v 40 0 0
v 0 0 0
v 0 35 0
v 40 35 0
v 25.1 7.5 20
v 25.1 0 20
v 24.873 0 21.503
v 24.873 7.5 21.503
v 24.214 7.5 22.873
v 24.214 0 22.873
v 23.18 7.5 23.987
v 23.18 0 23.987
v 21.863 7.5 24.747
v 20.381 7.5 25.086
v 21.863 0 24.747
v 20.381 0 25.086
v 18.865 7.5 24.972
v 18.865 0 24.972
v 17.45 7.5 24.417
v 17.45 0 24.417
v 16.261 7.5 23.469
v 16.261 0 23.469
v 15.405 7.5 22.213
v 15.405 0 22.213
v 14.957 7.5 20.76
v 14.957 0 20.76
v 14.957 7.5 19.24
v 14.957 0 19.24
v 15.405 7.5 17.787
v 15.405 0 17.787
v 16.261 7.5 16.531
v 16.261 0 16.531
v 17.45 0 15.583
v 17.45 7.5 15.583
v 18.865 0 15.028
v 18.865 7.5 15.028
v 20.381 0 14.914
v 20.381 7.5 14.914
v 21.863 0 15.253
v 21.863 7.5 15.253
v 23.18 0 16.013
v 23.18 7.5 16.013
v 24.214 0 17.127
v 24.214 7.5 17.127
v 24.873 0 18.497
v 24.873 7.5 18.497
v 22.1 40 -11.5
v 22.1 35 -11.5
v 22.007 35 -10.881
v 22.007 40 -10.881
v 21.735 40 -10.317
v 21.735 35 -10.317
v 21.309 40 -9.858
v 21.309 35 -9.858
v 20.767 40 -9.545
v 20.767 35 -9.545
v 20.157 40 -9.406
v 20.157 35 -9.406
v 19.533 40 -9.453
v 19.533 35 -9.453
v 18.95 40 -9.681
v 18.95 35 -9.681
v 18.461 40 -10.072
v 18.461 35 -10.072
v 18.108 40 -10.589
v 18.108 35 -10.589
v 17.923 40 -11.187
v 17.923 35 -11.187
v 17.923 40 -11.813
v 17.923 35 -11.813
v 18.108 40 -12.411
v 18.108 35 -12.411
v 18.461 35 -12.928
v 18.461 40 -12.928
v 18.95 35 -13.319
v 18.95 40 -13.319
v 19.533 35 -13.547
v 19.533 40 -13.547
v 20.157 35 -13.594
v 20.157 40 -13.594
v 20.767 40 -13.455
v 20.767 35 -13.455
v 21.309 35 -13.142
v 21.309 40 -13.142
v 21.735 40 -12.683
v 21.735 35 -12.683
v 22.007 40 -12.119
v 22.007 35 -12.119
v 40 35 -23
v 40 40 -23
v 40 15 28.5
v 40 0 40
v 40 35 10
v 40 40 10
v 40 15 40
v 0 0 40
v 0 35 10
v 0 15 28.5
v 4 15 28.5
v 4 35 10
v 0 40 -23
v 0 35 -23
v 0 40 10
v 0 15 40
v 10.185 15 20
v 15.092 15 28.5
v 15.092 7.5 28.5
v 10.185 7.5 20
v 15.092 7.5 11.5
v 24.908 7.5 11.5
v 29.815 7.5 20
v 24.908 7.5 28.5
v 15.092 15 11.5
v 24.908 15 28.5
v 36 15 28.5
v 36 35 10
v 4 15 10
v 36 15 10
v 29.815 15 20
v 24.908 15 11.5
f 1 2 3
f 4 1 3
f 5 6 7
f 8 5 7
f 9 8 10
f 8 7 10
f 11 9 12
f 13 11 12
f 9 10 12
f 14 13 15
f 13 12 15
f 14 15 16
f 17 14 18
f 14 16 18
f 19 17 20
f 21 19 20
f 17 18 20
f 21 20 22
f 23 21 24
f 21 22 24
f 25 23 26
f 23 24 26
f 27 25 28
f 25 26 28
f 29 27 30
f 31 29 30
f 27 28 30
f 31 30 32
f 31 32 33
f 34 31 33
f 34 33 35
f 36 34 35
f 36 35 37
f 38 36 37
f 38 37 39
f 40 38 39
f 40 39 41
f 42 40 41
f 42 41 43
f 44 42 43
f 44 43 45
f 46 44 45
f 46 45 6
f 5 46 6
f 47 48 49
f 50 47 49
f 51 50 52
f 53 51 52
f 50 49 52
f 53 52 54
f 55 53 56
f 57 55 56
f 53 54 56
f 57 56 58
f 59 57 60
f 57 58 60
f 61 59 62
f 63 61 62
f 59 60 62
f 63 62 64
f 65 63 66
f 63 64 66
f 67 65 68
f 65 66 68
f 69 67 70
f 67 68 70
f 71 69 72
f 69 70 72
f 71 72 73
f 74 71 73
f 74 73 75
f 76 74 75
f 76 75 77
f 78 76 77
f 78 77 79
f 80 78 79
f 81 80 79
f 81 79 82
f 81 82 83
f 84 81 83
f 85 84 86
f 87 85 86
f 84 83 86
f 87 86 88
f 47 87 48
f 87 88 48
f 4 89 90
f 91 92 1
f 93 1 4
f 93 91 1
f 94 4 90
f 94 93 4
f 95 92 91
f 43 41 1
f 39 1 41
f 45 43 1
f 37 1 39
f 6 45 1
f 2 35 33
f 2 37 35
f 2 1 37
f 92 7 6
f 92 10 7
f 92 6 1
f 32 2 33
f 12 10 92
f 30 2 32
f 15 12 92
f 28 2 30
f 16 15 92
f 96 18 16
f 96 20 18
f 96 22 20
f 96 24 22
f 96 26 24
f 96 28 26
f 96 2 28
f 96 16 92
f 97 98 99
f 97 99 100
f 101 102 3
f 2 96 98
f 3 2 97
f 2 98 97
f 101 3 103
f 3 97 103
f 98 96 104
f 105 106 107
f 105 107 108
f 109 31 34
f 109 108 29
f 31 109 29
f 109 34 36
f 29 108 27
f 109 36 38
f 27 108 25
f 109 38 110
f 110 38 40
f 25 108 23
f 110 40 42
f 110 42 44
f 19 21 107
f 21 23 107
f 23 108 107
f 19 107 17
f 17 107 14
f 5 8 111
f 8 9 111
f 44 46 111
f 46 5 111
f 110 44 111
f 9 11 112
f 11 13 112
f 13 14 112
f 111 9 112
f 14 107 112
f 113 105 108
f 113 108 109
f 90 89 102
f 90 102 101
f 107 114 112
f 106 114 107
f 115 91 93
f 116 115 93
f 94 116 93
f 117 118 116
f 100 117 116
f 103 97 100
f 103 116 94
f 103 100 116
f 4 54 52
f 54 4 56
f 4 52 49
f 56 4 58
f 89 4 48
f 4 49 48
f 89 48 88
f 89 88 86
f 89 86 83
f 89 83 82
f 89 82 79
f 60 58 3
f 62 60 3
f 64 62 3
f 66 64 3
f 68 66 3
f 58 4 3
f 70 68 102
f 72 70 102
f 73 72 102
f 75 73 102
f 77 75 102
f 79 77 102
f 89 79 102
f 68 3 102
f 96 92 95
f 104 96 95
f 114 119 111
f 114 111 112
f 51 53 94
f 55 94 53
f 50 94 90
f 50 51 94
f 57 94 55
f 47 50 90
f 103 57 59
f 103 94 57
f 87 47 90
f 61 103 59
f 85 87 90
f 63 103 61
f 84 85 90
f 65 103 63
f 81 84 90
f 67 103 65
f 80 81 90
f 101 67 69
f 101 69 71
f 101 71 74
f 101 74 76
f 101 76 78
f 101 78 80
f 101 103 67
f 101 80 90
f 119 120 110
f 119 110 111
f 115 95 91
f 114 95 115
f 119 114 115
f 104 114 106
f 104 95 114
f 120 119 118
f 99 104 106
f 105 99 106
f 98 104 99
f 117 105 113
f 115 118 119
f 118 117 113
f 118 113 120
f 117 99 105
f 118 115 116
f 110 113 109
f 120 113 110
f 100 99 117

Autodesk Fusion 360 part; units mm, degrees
sketch "Sketch1" plane through (0, 0, 0) normal (1, 0, 0) x (0, 1, 0)
  line L0 (0, 0) -> (35, 0)
  line L1 (35, 0) -> (35, -23)
  line L2 (35, -23) -> (40, -23)
  line L3 (0, 0) -> (0, 10)
  line L4 (15, 30.2) -> (15, 10)
  line L5 (15, 10) -> (40, 10)
  line L6 (40, 10) -> (40, -23)
  line L7 (0, 10) -> (0, 30)
  line L8 (0, 30) -> (0, 40)
  line L9 (0, 40) -> (15, 40)
  line L10 (15, 40) -> (15, 30.2)
  line L11 (15, 10) -> (15, 28.5) construction
  line L12 (15, 28.5) -> (35, 10)
  dimension "d1" = 35
  dimension "d2" = 23
  dimension "d3" = 5
  dimension "d4" = 10
  dimension "d8" = 20.2
  dimension "d9" = 20
  dimension "d10" = 10
  dimension "d19" = 18.5
extrude "Extrude1" add sketch "Sketch1" along normal blind 40 contours L0 L1 L2 L3 L4 L5 L6 L7 L8 L9 L10
sketch "Sketch2" plane through (0, 0, 0) normal (0, -1, 0) x (1, 0, 0)
  line L0 (0, 40) -> (0, 0)
  line L1 (0, 0) -> (40, 0)
  line L2 (40, 0) -> (40, 40)
  line L3 (40, 40) -> (0, 40)
  line L4 (29.815, 20) -> (24.9075, 28.5)
  line L5 (24.9075, 28.5) -> (15.0925, 28.5)
  line L6 (15.0925, 28.5) -> (10.185, 20)
  line L7 (10.185, 20) -> (15.0925, 11.5)
  line L8 (15.0925, 11.5) -> (24.9075, 11.5)
  line L9 (24.9075, 11.5) -> (29.815, 20)
  line L10 (0, 20) -> (40, 20) construction
  line L11 (20, 40) -> (20, 0) construction
  circle A0 centre (20, 20) radius 5.1
  line L12 (0, 0) -> (0, -11.5) construction
  line L13 (0, -11.5) -> (10, -11.5) construction
  line L14 (10, -11.5) -> (20, -11.5) construction
  circle A1 centre (20, -11.5) radius 2.1
  point P0 (20, 20)
  point P1 (20, 20)
  dimension "d13" = 8.5
  dimension "d14" = 10.2
  dimension "d25" = 11.5
  dimension "d26" = 10
  dimension "d27" = 4.2
extrude "Extrude2" cut sketch "Sketch2" against normal through all contours A0 | A1
extrude "Extrude3" cut sketch "Sketch2" along normal blind 7.5 from surface at -15 contours L4 L5 L6 L7 L8 L9
extrude "Extrude4" add sketch "Sketch1" along normal blind 4 contours L4 L5 L12
extrude "Extrude5" add sketch "Sketch1" against normal blind 4 from surface at 40 contours L4 L5 L12
sketch "Sketch3" plane through (0, 0, 10) normal (0, 0, 1) x (-1, 0, 0)
  line L0 (-36, -35) -> (-40, -35)
  line L1 (-40, -35) -> (-40, -40)
  line L2 (-40, -40) -> (0, -40)
  line L3 (0, -40) -> (0, -35)
  line L4 (0, -35) -> (-4, -35)
  line L5 (-4, -35) -> (-4, -15)
  line L6 (-4, -15) -> (-36, -15)
  line L7 (-36, -15) -> (-36, -35)
  line L8 (0, -40) -> (-10, -40) construction
  line L9 (-10, -40) -> (-10, -27.5) construction
  circle A0 centre (-10, -27.5) radius 1.6
  line L10 (-10, -27.5) -> (-30, -27.5) construction
  circle A1 centre (-30, -27.5) radius 1.6
  dimension "d28" = 10
  dimension "d29" = 12.5
  dimension "d30" = 3.2
  dimension "d31" = 20
  dimension "d32" = 3.2
extrude "Extrude6" cut sketch "Sketch3" along normal through all contours A0 | A1
equation "d8 = 30.200 mm - 10 mm"
equation "d13 = ( 17 / 2 ) * 1 mm"
equation "d19 = 28.50 mm - 10 mm"
equation "d25 = ( 23 / 2 ) * 1 mm"
equation "d29 = ( 25 / 2 ) * 1 mm"
